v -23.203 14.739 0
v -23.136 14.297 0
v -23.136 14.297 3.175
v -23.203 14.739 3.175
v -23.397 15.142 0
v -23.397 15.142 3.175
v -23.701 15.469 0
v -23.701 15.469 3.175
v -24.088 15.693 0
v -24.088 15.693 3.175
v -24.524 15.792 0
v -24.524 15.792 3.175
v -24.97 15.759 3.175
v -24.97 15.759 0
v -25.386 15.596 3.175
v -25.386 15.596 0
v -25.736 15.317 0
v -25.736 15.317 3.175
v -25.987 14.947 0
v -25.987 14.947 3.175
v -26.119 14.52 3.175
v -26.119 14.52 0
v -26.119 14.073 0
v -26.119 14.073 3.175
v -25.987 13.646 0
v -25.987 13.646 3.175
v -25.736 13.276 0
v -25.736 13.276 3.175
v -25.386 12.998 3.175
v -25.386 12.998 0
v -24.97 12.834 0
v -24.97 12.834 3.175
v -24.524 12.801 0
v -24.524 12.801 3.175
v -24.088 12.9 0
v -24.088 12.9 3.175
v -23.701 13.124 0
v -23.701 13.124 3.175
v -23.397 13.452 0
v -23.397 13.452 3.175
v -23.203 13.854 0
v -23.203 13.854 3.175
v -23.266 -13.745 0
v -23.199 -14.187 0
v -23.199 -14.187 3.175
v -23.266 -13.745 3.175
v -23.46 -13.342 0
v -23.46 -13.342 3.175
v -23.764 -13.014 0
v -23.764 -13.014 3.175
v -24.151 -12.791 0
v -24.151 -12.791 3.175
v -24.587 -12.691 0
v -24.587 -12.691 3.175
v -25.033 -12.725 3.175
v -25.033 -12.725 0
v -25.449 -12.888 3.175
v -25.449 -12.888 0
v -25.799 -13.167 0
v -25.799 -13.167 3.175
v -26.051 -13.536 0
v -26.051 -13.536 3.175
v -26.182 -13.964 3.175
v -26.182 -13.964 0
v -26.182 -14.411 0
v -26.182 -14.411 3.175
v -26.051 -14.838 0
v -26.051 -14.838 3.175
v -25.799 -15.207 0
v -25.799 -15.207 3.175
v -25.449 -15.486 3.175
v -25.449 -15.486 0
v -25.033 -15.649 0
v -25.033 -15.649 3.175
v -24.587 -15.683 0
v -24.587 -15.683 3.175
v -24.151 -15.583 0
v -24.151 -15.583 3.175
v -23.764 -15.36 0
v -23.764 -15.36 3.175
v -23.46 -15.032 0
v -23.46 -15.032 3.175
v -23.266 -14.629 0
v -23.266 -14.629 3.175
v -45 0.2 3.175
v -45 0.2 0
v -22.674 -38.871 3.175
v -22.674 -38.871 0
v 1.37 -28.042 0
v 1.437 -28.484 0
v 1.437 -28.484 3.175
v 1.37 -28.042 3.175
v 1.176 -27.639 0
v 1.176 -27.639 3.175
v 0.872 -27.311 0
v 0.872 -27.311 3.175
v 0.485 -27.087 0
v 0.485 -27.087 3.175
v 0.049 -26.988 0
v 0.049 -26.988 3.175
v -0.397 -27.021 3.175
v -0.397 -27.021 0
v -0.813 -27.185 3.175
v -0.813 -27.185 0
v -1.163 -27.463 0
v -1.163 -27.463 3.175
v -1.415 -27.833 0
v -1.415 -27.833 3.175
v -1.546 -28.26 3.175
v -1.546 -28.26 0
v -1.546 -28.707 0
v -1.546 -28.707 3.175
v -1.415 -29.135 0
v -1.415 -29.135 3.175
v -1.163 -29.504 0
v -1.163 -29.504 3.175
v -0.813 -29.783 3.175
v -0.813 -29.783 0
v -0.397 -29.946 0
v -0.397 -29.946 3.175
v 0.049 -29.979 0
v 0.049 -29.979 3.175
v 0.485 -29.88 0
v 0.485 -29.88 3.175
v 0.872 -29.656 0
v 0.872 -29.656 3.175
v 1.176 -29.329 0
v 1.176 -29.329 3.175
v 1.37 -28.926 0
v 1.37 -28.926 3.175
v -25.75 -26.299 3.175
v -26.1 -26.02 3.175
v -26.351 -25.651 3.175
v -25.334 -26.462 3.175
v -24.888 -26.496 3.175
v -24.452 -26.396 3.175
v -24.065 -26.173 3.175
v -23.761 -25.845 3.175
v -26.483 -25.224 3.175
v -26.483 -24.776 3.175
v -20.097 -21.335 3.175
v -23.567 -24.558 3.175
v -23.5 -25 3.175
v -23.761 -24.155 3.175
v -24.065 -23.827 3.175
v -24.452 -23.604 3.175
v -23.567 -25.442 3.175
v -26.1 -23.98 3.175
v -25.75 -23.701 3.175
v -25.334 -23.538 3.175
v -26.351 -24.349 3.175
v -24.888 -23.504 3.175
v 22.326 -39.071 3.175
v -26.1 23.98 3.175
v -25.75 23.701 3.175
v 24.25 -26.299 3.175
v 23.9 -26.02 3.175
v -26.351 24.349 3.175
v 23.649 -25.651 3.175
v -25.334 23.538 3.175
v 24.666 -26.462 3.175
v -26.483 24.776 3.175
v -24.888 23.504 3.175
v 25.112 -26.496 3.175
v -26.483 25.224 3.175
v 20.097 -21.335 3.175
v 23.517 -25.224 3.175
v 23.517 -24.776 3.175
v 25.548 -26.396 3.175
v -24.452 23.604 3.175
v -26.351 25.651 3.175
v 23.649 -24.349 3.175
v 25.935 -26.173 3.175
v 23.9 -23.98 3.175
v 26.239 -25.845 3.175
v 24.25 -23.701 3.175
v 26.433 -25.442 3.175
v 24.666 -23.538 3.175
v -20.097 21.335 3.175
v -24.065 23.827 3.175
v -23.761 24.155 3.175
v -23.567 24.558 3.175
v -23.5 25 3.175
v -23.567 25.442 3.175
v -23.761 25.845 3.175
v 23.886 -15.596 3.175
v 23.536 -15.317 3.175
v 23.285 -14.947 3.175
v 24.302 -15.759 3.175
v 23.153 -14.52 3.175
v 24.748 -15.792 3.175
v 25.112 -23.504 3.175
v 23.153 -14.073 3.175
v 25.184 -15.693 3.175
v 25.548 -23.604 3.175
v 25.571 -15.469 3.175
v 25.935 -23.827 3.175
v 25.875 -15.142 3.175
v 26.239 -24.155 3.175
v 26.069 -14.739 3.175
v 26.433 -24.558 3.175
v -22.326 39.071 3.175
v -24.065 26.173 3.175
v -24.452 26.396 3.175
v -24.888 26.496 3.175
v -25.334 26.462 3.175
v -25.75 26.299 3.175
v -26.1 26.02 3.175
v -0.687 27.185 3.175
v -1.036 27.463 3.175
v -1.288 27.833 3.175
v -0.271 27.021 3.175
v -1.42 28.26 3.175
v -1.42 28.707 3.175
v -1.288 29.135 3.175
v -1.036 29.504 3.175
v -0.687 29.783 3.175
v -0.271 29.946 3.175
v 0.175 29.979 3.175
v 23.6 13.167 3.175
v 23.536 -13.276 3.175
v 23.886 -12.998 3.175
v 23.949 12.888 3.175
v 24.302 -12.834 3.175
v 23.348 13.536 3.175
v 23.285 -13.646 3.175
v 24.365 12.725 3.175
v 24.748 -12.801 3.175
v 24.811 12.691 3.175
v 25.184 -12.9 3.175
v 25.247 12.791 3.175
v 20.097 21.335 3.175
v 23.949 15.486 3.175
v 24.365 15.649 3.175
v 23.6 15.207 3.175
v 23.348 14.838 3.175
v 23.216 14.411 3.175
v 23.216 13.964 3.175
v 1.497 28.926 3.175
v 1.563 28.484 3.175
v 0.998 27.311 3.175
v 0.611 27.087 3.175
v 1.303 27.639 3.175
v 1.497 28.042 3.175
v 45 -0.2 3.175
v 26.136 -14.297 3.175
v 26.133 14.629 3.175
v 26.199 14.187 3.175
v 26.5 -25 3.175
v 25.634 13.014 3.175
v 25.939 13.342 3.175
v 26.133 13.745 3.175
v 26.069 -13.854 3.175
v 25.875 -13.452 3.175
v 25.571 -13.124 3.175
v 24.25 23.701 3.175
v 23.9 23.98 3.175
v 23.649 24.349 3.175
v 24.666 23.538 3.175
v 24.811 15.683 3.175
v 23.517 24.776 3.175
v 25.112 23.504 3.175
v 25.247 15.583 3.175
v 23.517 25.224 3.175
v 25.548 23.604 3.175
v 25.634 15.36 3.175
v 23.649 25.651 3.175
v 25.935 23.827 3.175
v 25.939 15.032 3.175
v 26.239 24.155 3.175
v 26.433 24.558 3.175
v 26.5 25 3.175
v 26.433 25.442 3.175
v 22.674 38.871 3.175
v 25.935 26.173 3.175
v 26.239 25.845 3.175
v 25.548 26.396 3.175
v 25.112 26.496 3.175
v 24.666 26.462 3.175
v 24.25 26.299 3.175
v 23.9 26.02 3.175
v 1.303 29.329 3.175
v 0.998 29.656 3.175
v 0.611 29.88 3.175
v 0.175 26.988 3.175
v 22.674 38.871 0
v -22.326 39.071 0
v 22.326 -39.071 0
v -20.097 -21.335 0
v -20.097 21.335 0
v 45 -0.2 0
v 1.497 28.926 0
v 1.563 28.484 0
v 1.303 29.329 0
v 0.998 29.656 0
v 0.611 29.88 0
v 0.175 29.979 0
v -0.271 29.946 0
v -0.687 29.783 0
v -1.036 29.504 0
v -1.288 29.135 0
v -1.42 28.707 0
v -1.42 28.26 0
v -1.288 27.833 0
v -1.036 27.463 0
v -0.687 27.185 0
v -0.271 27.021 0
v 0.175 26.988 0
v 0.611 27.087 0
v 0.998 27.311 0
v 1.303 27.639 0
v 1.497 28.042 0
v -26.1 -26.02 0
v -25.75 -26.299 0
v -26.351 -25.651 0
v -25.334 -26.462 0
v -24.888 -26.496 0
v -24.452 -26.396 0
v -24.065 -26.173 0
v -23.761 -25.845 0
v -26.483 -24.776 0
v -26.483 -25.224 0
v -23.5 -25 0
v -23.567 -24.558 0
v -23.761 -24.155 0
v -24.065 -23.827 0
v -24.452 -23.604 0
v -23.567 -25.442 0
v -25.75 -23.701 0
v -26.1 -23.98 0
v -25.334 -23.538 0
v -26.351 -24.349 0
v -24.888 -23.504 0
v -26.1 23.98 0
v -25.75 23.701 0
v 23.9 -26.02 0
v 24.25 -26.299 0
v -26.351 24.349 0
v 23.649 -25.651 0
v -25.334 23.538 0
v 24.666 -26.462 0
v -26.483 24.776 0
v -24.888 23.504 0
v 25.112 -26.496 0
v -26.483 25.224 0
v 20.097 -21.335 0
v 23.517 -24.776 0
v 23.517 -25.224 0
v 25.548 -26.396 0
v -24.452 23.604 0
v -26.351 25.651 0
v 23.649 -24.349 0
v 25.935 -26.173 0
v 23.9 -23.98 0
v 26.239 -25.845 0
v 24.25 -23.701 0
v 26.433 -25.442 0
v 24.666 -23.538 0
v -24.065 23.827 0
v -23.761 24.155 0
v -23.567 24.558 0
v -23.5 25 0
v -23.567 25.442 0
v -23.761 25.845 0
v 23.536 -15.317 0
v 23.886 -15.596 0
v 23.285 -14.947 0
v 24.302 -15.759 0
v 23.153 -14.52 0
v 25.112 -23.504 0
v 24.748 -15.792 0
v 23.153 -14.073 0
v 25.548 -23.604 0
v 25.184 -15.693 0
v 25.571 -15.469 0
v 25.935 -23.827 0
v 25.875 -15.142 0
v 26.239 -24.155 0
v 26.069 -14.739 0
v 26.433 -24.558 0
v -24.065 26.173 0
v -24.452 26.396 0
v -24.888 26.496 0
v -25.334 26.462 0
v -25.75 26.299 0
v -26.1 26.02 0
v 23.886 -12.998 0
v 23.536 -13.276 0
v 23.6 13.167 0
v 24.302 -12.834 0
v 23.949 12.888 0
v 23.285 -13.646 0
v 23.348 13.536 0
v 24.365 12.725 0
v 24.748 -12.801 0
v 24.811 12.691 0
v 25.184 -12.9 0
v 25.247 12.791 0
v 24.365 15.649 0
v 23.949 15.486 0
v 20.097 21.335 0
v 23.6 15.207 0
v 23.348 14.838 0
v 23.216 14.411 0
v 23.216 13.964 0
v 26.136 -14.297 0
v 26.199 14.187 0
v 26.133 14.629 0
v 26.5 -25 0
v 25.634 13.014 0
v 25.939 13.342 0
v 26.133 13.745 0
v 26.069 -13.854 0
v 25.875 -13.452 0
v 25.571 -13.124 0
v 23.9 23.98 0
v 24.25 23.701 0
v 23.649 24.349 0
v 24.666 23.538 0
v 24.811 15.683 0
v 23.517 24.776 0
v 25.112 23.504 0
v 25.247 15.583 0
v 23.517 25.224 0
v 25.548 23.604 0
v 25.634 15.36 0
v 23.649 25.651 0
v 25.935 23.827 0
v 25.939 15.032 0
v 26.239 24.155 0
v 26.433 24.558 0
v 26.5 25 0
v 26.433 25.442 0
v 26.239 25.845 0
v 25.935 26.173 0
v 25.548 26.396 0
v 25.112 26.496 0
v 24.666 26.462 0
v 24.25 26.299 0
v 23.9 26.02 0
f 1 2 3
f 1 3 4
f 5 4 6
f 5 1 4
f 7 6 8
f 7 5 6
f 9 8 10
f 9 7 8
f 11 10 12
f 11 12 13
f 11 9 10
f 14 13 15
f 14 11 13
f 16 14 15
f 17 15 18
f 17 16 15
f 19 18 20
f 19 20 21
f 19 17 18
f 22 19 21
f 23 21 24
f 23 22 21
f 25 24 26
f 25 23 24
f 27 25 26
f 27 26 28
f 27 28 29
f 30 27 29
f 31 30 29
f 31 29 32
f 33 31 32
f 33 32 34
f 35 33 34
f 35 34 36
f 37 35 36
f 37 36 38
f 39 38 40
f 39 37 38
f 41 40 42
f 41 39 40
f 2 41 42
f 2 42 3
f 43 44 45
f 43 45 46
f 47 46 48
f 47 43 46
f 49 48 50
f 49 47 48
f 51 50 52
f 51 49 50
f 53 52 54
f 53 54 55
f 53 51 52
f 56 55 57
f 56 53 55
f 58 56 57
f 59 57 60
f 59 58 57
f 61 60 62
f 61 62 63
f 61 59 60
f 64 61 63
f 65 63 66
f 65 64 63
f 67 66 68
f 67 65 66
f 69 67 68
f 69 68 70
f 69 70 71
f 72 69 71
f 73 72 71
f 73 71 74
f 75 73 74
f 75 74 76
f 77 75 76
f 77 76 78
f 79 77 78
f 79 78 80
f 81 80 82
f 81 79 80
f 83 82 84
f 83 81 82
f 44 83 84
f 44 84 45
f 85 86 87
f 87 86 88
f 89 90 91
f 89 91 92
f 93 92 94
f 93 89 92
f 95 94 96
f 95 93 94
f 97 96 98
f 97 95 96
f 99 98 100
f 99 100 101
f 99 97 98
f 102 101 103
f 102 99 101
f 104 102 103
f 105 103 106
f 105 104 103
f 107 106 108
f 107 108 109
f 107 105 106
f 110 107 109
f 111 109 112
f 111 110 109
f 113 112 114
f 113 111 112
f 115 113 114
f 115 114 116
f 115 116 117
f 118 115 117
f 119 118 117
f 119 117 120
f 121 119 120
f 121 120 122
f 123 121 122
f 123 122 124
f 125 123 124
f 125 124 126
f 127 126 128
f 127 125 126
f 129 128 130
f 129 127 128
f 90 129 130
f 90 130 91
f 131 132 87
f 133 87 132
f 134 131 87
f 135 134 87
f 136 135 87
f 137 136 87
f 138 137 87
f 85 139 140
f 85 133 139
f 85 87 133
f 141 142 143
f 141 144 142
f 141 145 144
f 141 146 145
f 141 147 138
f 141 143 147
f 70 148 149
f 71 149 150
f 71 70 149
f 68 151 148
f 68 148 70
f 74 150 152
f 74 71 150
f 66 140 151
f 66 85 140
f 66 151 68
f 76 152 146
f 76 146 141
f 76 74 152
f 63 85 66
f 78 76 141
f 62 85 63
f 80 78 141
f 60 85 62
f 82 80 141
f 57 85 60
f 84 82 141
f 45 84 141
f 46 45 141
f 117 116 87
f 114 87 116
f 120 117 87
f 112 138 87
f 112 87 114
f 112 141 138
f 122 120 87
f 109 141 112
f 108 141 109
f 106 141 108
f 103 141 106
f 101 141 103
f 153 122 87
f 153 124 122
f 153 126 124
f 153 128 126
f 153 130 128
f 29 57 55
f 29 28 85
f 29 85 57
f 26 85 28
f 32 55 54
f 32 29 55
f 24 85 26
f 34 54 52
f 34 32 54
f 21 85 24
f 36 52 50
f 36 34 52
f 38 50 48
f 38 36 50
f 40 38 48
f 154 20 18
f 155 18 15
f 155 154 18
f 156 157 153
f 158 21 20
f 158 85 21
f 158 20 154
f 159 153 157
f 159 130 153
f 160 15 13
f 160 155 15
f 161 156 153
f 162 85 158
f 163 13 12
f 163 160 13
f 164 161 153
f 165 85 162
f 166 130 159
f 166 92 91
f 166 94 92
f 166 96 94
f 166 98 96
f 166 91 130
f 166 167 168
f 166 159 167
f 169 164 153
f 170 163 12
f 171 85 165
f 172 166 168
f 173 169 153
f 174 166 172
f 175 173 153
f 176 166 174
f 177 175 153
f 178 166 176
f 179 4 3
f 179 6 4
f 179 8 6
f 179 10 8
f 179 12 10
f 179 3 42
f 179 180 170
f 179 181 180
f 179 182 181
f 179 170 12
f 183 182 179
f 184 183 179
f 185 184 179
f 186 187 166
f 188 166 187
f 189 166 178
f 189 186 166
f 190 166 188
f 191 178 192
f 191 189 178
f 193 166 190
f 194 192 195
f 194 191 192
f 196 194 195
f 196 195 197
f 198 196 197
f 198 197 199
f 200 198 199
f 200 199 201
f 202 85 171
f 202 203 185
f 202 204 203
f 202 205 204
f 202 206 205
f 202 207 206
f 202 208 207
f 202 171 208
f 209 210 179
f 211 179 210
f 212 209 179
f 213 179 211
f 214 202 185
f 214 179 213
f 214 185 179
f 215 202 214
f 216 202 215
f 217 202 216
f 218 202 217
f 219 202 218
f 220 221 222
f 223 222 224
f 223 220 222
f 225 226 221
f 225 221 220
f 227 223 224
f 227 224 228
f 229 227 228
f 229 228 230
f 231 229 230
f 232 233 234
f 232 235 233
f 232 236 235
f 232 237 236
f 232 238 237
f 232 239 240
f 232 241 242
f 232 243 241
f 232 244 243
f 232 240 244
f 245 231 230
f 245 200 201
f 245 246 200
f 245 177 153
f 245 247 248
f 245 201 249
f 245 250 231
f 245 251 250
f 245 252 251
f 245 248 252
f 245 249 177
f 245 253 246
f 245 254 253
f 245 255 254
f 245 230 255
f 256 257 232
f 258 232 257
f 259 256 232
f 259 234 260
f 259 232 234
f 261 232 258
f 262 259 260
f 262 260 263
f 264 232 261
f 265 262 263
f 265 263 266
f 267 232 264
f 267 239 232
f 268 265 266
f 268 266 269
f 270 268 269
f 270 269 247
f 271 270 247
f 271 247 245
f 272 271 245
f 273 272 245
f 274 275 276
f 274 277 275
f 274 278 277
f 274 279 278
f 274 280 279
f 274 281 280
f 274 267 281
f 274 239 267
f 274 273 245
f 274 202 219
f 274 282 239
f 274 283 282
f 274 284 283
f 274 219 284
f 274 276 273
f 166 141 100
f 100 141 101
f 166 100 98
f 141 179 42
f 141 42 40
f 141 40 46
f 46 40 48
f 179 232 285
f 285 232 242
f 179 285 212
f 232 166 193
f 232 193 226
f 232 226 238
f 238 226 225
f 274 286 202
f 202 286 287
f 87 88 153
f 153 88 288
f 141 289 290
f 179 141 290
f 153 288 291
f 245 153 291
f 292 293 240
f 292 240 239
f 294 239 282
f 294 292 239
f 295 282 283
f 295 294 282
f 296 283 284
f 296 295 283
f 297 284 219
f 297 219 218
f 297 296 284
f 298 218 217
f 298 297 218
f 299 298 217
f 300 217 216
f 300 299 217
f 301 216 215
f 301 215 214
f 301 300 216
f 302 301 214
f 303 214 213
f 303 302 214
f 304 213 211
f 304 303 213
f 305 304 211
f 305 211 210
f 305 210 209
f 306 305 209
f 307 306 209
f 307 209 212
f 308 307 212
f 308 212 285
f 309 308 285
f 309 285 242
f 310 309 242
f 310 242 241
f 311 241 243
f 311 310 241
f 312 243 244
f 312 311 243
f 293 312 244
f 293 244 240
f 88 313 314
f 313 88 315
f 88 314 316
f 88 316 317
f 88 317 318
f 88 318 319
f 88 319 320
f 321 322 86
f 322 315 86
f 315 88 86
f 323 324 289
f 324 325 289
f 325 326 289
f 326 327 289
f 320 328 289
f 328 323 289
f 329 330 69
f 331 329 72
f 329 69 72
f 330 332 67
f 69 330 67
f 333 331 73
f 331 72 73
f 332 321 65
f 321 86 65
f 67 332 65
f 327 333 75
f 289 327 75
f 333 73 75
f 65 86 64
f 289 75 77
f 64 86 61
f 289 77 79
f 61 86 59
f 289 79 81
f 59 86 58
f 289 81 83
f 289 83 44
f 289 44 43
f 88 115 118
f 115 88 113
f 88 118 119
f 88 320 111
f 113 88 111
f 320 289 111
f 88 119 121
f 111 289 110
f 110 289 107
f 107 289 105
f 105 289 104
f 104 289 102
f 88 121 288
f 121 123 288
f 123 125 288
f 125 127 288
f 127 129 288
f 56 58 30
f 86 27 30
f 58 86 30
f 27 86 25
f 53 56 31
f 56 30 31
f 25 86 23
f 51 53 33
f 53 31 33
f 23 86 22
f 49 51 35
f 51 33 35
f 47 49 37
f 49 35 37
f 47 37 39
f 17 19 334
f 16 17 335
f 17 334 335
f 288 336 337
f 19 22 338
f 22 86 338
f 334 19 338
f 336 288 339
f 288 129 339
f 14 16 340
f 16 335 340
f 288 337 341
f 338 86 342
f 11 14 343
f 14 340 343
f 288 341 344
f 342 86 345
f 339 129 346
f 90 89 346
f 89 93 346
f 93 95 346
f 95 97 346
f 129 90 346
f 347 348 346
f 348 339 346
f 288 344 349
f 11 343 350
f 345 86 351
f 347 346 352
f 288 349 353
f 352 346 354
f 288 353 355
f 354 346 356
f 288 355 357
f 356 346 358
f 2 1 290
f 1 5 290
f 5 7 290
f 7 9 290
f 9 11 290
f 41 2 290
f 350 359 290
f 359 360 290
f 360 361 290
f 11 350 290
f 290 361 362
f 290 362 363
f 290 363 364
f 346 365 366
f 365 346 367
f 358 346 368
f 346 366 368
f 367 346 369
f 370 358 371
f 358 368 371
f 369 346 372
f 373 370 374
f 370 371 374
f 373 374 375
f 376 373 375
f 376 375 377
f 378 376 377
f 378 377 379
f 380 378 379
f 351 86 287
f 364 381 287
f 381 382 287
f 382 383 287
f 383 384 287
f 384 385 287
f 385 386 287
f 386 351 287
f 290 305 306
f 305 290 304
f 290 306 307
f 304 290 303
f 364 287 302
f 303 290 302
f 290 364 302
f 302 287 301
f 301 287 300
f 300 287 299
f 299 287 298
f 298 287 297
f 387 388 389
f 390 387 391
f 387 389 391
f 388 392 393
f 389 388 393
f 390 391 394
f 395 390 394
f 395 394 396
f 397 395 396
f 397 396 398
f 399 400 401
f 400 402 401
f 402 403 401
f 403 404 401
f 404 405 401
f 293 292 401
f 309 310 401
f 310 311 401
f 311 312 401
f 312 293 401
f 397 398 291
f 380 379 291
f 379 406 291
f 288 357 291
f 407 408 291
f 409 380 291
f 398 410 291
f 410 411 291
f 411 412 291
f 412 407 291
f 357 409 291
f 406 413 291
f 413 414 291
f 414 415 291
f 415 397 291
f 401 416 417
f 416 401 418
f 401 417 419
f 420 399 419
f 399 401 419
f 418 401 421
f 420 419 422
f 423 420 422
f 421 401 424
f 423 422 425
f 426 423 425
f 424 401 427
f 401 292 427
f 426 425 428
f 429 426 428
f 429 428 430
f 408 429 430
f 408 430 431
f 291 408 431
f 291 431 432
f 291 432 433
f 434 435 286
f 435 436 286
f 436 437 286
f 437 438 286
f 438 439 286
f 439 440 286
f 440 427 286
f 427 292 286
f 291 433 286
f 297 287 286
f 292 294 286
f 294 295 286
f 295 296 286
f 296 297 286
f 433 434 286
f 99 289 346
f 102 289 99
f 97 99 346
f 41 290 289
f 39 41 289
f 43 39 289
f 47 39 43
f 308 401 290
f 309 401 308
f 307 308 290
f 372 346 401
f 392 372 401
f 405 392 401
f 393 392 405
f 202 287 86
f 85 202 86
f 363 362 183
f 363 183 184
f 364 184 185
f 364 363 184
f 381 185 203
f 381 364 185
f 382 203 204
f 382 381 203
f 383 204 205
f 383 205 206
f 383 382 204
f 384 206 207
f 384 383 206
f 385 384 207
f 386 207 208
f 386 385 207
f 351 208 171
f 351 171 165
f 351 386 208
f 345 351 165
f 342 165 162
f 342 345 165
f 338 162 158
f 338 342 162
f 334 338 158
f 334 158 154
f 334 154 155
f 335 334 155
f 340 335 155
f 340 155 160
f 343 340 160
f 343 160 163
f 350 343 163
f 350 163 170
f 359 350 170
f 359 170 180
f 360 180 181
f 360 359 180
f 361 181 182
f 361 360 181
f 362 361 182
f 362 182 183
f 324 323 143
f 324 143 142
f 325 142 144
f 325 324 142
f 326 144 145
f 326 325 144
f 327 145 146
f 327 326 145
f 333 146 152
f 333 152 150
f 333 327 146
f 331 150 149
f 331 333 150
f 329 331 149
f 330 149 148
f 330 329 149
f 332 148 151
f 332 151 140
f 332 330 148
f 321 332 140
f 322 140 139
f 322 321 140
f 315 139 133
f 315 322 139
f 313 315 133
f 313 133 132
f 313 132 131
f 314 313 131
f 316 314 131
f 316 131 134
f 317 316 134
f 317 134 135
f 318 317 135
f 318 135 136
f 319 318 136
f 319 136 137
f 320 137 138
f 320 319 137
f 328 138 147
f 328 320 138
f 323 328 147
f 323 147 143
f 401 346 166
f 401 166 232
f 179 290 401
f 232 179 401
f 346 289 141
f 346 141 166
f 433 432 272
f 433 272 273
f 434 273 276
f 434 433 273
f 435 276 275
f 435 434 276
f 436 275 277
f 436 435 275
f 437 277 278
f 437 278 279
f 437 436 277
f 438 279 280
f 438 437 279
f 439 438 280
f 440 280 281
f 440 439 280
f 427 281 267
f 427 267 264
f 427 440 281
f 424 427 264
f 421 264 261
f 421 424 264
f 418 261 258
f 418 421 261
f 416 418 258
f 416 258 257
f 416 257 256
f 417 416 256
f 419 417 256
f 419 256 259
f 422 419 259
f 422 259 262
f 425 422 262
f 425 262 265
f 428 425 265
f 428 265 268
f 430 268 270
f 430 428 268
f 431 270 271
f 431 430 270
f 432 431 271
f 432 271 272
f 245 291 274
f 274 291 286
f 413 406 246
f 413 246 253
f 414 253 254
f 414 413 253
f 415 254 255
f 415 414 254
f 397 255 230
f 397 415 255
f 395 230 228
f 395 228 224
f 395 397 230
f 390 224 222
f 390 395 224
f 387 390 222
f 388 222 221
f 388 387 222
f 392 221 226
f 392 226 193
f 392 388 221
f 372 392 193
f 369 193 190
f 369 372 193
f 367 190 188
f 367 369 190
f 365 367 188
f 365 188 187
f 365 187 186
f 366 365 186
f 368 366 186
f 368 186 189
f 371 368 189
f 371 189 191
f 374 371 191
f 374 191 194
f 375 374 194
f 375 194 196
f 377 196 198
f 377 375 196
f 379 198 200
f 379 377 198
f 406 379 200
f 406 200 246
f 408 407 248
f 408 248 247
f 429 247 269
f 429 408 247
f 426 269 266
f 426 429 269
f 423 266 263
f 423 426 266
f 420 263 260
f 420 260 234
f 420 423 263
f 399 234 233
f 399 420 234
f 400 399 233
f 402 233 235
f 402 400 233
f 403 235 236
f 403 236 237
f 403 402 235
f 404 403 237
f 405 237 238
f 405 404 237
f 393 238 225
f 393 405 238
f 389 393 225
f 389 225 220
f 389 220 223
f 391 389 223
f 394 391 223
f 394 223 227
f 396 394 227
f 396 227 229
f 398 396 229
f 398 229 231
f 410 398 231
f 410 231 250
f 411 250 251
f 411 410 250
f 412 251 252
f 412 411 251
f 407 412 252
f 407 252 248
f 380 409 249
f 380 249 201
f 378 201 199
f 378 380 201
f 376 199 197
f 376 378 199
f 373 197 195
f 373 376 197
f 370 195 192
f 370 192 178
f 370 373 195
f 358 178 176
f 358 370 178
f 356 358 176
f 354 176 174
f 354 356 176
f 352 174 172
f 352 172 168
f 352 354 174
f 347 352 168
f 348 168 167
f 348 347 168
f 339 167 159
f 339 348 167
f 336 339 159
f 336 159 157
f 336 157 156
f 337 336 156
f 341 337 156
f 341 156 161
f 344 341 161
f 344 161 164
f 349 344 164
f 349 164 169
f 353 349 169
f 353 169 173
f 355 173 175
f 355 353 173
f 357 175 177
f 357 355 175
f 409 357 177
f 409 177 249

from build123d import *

# Parameters (mm, degrees)
F0_R     = 1.5
F0_W     = 40.193852
F0_H     = 42.670768
F1_DEPTH = 3.175


with BuildPart() as f1:
    # F0 (on Top) → F1 (new body)
    with BuildSketch(Plane.XY):
        Polygon((-22.673526, -38.870958), (22.326474, -39.071328), (45, -0.20037), (22.673526, 38.870958), (-22.326474, 39.071328), (-45, 0.20037), align=None)
        with Locations((-25, -25)):
            Circle(F0_R, mode=Mode.SUBTRACT)
        with Locations((-0.063241, -28.483691)):
            Circle(F0_R, mode=Mode.SUBTRACT)
        with Locations((-24.69922, -14.187078)):
            Circle(F0_R, mode=Mode.SUBTRACT)
        with Locations((25, -25)):
            Circle(F0_R, mode=Mode.SUBTRACT)
        with Locations((24.63598, -14.296613)):
            Circle(F0_R, mode=Mode.SUBTRACT)
        with Locations((-24.63598, 14.296613)):
            Circle(F0_R, mode=Mode.SUBTRACT)
        with Locations((-25, 25)):
            Circle(F0_R, mode=Mode.SUBTRACT)
        Rectangle(F0_W, F0_H, mode=Mode.SUBTRACT)
        with Locations((24.69922, 14.187078)):
            Circle(F0_R, mode=Mode.SUBTRACT)
        with Locations((0.063241, 28.483691)):
            Circle(F0_R, mode=Mode.SUBTRACT)
        with Locations((25, 25)):
            Circle(F0_R, mode=Mode.SUBTRACT)
    extrude(amount=F1_DEPTH)


solid = f1.part
